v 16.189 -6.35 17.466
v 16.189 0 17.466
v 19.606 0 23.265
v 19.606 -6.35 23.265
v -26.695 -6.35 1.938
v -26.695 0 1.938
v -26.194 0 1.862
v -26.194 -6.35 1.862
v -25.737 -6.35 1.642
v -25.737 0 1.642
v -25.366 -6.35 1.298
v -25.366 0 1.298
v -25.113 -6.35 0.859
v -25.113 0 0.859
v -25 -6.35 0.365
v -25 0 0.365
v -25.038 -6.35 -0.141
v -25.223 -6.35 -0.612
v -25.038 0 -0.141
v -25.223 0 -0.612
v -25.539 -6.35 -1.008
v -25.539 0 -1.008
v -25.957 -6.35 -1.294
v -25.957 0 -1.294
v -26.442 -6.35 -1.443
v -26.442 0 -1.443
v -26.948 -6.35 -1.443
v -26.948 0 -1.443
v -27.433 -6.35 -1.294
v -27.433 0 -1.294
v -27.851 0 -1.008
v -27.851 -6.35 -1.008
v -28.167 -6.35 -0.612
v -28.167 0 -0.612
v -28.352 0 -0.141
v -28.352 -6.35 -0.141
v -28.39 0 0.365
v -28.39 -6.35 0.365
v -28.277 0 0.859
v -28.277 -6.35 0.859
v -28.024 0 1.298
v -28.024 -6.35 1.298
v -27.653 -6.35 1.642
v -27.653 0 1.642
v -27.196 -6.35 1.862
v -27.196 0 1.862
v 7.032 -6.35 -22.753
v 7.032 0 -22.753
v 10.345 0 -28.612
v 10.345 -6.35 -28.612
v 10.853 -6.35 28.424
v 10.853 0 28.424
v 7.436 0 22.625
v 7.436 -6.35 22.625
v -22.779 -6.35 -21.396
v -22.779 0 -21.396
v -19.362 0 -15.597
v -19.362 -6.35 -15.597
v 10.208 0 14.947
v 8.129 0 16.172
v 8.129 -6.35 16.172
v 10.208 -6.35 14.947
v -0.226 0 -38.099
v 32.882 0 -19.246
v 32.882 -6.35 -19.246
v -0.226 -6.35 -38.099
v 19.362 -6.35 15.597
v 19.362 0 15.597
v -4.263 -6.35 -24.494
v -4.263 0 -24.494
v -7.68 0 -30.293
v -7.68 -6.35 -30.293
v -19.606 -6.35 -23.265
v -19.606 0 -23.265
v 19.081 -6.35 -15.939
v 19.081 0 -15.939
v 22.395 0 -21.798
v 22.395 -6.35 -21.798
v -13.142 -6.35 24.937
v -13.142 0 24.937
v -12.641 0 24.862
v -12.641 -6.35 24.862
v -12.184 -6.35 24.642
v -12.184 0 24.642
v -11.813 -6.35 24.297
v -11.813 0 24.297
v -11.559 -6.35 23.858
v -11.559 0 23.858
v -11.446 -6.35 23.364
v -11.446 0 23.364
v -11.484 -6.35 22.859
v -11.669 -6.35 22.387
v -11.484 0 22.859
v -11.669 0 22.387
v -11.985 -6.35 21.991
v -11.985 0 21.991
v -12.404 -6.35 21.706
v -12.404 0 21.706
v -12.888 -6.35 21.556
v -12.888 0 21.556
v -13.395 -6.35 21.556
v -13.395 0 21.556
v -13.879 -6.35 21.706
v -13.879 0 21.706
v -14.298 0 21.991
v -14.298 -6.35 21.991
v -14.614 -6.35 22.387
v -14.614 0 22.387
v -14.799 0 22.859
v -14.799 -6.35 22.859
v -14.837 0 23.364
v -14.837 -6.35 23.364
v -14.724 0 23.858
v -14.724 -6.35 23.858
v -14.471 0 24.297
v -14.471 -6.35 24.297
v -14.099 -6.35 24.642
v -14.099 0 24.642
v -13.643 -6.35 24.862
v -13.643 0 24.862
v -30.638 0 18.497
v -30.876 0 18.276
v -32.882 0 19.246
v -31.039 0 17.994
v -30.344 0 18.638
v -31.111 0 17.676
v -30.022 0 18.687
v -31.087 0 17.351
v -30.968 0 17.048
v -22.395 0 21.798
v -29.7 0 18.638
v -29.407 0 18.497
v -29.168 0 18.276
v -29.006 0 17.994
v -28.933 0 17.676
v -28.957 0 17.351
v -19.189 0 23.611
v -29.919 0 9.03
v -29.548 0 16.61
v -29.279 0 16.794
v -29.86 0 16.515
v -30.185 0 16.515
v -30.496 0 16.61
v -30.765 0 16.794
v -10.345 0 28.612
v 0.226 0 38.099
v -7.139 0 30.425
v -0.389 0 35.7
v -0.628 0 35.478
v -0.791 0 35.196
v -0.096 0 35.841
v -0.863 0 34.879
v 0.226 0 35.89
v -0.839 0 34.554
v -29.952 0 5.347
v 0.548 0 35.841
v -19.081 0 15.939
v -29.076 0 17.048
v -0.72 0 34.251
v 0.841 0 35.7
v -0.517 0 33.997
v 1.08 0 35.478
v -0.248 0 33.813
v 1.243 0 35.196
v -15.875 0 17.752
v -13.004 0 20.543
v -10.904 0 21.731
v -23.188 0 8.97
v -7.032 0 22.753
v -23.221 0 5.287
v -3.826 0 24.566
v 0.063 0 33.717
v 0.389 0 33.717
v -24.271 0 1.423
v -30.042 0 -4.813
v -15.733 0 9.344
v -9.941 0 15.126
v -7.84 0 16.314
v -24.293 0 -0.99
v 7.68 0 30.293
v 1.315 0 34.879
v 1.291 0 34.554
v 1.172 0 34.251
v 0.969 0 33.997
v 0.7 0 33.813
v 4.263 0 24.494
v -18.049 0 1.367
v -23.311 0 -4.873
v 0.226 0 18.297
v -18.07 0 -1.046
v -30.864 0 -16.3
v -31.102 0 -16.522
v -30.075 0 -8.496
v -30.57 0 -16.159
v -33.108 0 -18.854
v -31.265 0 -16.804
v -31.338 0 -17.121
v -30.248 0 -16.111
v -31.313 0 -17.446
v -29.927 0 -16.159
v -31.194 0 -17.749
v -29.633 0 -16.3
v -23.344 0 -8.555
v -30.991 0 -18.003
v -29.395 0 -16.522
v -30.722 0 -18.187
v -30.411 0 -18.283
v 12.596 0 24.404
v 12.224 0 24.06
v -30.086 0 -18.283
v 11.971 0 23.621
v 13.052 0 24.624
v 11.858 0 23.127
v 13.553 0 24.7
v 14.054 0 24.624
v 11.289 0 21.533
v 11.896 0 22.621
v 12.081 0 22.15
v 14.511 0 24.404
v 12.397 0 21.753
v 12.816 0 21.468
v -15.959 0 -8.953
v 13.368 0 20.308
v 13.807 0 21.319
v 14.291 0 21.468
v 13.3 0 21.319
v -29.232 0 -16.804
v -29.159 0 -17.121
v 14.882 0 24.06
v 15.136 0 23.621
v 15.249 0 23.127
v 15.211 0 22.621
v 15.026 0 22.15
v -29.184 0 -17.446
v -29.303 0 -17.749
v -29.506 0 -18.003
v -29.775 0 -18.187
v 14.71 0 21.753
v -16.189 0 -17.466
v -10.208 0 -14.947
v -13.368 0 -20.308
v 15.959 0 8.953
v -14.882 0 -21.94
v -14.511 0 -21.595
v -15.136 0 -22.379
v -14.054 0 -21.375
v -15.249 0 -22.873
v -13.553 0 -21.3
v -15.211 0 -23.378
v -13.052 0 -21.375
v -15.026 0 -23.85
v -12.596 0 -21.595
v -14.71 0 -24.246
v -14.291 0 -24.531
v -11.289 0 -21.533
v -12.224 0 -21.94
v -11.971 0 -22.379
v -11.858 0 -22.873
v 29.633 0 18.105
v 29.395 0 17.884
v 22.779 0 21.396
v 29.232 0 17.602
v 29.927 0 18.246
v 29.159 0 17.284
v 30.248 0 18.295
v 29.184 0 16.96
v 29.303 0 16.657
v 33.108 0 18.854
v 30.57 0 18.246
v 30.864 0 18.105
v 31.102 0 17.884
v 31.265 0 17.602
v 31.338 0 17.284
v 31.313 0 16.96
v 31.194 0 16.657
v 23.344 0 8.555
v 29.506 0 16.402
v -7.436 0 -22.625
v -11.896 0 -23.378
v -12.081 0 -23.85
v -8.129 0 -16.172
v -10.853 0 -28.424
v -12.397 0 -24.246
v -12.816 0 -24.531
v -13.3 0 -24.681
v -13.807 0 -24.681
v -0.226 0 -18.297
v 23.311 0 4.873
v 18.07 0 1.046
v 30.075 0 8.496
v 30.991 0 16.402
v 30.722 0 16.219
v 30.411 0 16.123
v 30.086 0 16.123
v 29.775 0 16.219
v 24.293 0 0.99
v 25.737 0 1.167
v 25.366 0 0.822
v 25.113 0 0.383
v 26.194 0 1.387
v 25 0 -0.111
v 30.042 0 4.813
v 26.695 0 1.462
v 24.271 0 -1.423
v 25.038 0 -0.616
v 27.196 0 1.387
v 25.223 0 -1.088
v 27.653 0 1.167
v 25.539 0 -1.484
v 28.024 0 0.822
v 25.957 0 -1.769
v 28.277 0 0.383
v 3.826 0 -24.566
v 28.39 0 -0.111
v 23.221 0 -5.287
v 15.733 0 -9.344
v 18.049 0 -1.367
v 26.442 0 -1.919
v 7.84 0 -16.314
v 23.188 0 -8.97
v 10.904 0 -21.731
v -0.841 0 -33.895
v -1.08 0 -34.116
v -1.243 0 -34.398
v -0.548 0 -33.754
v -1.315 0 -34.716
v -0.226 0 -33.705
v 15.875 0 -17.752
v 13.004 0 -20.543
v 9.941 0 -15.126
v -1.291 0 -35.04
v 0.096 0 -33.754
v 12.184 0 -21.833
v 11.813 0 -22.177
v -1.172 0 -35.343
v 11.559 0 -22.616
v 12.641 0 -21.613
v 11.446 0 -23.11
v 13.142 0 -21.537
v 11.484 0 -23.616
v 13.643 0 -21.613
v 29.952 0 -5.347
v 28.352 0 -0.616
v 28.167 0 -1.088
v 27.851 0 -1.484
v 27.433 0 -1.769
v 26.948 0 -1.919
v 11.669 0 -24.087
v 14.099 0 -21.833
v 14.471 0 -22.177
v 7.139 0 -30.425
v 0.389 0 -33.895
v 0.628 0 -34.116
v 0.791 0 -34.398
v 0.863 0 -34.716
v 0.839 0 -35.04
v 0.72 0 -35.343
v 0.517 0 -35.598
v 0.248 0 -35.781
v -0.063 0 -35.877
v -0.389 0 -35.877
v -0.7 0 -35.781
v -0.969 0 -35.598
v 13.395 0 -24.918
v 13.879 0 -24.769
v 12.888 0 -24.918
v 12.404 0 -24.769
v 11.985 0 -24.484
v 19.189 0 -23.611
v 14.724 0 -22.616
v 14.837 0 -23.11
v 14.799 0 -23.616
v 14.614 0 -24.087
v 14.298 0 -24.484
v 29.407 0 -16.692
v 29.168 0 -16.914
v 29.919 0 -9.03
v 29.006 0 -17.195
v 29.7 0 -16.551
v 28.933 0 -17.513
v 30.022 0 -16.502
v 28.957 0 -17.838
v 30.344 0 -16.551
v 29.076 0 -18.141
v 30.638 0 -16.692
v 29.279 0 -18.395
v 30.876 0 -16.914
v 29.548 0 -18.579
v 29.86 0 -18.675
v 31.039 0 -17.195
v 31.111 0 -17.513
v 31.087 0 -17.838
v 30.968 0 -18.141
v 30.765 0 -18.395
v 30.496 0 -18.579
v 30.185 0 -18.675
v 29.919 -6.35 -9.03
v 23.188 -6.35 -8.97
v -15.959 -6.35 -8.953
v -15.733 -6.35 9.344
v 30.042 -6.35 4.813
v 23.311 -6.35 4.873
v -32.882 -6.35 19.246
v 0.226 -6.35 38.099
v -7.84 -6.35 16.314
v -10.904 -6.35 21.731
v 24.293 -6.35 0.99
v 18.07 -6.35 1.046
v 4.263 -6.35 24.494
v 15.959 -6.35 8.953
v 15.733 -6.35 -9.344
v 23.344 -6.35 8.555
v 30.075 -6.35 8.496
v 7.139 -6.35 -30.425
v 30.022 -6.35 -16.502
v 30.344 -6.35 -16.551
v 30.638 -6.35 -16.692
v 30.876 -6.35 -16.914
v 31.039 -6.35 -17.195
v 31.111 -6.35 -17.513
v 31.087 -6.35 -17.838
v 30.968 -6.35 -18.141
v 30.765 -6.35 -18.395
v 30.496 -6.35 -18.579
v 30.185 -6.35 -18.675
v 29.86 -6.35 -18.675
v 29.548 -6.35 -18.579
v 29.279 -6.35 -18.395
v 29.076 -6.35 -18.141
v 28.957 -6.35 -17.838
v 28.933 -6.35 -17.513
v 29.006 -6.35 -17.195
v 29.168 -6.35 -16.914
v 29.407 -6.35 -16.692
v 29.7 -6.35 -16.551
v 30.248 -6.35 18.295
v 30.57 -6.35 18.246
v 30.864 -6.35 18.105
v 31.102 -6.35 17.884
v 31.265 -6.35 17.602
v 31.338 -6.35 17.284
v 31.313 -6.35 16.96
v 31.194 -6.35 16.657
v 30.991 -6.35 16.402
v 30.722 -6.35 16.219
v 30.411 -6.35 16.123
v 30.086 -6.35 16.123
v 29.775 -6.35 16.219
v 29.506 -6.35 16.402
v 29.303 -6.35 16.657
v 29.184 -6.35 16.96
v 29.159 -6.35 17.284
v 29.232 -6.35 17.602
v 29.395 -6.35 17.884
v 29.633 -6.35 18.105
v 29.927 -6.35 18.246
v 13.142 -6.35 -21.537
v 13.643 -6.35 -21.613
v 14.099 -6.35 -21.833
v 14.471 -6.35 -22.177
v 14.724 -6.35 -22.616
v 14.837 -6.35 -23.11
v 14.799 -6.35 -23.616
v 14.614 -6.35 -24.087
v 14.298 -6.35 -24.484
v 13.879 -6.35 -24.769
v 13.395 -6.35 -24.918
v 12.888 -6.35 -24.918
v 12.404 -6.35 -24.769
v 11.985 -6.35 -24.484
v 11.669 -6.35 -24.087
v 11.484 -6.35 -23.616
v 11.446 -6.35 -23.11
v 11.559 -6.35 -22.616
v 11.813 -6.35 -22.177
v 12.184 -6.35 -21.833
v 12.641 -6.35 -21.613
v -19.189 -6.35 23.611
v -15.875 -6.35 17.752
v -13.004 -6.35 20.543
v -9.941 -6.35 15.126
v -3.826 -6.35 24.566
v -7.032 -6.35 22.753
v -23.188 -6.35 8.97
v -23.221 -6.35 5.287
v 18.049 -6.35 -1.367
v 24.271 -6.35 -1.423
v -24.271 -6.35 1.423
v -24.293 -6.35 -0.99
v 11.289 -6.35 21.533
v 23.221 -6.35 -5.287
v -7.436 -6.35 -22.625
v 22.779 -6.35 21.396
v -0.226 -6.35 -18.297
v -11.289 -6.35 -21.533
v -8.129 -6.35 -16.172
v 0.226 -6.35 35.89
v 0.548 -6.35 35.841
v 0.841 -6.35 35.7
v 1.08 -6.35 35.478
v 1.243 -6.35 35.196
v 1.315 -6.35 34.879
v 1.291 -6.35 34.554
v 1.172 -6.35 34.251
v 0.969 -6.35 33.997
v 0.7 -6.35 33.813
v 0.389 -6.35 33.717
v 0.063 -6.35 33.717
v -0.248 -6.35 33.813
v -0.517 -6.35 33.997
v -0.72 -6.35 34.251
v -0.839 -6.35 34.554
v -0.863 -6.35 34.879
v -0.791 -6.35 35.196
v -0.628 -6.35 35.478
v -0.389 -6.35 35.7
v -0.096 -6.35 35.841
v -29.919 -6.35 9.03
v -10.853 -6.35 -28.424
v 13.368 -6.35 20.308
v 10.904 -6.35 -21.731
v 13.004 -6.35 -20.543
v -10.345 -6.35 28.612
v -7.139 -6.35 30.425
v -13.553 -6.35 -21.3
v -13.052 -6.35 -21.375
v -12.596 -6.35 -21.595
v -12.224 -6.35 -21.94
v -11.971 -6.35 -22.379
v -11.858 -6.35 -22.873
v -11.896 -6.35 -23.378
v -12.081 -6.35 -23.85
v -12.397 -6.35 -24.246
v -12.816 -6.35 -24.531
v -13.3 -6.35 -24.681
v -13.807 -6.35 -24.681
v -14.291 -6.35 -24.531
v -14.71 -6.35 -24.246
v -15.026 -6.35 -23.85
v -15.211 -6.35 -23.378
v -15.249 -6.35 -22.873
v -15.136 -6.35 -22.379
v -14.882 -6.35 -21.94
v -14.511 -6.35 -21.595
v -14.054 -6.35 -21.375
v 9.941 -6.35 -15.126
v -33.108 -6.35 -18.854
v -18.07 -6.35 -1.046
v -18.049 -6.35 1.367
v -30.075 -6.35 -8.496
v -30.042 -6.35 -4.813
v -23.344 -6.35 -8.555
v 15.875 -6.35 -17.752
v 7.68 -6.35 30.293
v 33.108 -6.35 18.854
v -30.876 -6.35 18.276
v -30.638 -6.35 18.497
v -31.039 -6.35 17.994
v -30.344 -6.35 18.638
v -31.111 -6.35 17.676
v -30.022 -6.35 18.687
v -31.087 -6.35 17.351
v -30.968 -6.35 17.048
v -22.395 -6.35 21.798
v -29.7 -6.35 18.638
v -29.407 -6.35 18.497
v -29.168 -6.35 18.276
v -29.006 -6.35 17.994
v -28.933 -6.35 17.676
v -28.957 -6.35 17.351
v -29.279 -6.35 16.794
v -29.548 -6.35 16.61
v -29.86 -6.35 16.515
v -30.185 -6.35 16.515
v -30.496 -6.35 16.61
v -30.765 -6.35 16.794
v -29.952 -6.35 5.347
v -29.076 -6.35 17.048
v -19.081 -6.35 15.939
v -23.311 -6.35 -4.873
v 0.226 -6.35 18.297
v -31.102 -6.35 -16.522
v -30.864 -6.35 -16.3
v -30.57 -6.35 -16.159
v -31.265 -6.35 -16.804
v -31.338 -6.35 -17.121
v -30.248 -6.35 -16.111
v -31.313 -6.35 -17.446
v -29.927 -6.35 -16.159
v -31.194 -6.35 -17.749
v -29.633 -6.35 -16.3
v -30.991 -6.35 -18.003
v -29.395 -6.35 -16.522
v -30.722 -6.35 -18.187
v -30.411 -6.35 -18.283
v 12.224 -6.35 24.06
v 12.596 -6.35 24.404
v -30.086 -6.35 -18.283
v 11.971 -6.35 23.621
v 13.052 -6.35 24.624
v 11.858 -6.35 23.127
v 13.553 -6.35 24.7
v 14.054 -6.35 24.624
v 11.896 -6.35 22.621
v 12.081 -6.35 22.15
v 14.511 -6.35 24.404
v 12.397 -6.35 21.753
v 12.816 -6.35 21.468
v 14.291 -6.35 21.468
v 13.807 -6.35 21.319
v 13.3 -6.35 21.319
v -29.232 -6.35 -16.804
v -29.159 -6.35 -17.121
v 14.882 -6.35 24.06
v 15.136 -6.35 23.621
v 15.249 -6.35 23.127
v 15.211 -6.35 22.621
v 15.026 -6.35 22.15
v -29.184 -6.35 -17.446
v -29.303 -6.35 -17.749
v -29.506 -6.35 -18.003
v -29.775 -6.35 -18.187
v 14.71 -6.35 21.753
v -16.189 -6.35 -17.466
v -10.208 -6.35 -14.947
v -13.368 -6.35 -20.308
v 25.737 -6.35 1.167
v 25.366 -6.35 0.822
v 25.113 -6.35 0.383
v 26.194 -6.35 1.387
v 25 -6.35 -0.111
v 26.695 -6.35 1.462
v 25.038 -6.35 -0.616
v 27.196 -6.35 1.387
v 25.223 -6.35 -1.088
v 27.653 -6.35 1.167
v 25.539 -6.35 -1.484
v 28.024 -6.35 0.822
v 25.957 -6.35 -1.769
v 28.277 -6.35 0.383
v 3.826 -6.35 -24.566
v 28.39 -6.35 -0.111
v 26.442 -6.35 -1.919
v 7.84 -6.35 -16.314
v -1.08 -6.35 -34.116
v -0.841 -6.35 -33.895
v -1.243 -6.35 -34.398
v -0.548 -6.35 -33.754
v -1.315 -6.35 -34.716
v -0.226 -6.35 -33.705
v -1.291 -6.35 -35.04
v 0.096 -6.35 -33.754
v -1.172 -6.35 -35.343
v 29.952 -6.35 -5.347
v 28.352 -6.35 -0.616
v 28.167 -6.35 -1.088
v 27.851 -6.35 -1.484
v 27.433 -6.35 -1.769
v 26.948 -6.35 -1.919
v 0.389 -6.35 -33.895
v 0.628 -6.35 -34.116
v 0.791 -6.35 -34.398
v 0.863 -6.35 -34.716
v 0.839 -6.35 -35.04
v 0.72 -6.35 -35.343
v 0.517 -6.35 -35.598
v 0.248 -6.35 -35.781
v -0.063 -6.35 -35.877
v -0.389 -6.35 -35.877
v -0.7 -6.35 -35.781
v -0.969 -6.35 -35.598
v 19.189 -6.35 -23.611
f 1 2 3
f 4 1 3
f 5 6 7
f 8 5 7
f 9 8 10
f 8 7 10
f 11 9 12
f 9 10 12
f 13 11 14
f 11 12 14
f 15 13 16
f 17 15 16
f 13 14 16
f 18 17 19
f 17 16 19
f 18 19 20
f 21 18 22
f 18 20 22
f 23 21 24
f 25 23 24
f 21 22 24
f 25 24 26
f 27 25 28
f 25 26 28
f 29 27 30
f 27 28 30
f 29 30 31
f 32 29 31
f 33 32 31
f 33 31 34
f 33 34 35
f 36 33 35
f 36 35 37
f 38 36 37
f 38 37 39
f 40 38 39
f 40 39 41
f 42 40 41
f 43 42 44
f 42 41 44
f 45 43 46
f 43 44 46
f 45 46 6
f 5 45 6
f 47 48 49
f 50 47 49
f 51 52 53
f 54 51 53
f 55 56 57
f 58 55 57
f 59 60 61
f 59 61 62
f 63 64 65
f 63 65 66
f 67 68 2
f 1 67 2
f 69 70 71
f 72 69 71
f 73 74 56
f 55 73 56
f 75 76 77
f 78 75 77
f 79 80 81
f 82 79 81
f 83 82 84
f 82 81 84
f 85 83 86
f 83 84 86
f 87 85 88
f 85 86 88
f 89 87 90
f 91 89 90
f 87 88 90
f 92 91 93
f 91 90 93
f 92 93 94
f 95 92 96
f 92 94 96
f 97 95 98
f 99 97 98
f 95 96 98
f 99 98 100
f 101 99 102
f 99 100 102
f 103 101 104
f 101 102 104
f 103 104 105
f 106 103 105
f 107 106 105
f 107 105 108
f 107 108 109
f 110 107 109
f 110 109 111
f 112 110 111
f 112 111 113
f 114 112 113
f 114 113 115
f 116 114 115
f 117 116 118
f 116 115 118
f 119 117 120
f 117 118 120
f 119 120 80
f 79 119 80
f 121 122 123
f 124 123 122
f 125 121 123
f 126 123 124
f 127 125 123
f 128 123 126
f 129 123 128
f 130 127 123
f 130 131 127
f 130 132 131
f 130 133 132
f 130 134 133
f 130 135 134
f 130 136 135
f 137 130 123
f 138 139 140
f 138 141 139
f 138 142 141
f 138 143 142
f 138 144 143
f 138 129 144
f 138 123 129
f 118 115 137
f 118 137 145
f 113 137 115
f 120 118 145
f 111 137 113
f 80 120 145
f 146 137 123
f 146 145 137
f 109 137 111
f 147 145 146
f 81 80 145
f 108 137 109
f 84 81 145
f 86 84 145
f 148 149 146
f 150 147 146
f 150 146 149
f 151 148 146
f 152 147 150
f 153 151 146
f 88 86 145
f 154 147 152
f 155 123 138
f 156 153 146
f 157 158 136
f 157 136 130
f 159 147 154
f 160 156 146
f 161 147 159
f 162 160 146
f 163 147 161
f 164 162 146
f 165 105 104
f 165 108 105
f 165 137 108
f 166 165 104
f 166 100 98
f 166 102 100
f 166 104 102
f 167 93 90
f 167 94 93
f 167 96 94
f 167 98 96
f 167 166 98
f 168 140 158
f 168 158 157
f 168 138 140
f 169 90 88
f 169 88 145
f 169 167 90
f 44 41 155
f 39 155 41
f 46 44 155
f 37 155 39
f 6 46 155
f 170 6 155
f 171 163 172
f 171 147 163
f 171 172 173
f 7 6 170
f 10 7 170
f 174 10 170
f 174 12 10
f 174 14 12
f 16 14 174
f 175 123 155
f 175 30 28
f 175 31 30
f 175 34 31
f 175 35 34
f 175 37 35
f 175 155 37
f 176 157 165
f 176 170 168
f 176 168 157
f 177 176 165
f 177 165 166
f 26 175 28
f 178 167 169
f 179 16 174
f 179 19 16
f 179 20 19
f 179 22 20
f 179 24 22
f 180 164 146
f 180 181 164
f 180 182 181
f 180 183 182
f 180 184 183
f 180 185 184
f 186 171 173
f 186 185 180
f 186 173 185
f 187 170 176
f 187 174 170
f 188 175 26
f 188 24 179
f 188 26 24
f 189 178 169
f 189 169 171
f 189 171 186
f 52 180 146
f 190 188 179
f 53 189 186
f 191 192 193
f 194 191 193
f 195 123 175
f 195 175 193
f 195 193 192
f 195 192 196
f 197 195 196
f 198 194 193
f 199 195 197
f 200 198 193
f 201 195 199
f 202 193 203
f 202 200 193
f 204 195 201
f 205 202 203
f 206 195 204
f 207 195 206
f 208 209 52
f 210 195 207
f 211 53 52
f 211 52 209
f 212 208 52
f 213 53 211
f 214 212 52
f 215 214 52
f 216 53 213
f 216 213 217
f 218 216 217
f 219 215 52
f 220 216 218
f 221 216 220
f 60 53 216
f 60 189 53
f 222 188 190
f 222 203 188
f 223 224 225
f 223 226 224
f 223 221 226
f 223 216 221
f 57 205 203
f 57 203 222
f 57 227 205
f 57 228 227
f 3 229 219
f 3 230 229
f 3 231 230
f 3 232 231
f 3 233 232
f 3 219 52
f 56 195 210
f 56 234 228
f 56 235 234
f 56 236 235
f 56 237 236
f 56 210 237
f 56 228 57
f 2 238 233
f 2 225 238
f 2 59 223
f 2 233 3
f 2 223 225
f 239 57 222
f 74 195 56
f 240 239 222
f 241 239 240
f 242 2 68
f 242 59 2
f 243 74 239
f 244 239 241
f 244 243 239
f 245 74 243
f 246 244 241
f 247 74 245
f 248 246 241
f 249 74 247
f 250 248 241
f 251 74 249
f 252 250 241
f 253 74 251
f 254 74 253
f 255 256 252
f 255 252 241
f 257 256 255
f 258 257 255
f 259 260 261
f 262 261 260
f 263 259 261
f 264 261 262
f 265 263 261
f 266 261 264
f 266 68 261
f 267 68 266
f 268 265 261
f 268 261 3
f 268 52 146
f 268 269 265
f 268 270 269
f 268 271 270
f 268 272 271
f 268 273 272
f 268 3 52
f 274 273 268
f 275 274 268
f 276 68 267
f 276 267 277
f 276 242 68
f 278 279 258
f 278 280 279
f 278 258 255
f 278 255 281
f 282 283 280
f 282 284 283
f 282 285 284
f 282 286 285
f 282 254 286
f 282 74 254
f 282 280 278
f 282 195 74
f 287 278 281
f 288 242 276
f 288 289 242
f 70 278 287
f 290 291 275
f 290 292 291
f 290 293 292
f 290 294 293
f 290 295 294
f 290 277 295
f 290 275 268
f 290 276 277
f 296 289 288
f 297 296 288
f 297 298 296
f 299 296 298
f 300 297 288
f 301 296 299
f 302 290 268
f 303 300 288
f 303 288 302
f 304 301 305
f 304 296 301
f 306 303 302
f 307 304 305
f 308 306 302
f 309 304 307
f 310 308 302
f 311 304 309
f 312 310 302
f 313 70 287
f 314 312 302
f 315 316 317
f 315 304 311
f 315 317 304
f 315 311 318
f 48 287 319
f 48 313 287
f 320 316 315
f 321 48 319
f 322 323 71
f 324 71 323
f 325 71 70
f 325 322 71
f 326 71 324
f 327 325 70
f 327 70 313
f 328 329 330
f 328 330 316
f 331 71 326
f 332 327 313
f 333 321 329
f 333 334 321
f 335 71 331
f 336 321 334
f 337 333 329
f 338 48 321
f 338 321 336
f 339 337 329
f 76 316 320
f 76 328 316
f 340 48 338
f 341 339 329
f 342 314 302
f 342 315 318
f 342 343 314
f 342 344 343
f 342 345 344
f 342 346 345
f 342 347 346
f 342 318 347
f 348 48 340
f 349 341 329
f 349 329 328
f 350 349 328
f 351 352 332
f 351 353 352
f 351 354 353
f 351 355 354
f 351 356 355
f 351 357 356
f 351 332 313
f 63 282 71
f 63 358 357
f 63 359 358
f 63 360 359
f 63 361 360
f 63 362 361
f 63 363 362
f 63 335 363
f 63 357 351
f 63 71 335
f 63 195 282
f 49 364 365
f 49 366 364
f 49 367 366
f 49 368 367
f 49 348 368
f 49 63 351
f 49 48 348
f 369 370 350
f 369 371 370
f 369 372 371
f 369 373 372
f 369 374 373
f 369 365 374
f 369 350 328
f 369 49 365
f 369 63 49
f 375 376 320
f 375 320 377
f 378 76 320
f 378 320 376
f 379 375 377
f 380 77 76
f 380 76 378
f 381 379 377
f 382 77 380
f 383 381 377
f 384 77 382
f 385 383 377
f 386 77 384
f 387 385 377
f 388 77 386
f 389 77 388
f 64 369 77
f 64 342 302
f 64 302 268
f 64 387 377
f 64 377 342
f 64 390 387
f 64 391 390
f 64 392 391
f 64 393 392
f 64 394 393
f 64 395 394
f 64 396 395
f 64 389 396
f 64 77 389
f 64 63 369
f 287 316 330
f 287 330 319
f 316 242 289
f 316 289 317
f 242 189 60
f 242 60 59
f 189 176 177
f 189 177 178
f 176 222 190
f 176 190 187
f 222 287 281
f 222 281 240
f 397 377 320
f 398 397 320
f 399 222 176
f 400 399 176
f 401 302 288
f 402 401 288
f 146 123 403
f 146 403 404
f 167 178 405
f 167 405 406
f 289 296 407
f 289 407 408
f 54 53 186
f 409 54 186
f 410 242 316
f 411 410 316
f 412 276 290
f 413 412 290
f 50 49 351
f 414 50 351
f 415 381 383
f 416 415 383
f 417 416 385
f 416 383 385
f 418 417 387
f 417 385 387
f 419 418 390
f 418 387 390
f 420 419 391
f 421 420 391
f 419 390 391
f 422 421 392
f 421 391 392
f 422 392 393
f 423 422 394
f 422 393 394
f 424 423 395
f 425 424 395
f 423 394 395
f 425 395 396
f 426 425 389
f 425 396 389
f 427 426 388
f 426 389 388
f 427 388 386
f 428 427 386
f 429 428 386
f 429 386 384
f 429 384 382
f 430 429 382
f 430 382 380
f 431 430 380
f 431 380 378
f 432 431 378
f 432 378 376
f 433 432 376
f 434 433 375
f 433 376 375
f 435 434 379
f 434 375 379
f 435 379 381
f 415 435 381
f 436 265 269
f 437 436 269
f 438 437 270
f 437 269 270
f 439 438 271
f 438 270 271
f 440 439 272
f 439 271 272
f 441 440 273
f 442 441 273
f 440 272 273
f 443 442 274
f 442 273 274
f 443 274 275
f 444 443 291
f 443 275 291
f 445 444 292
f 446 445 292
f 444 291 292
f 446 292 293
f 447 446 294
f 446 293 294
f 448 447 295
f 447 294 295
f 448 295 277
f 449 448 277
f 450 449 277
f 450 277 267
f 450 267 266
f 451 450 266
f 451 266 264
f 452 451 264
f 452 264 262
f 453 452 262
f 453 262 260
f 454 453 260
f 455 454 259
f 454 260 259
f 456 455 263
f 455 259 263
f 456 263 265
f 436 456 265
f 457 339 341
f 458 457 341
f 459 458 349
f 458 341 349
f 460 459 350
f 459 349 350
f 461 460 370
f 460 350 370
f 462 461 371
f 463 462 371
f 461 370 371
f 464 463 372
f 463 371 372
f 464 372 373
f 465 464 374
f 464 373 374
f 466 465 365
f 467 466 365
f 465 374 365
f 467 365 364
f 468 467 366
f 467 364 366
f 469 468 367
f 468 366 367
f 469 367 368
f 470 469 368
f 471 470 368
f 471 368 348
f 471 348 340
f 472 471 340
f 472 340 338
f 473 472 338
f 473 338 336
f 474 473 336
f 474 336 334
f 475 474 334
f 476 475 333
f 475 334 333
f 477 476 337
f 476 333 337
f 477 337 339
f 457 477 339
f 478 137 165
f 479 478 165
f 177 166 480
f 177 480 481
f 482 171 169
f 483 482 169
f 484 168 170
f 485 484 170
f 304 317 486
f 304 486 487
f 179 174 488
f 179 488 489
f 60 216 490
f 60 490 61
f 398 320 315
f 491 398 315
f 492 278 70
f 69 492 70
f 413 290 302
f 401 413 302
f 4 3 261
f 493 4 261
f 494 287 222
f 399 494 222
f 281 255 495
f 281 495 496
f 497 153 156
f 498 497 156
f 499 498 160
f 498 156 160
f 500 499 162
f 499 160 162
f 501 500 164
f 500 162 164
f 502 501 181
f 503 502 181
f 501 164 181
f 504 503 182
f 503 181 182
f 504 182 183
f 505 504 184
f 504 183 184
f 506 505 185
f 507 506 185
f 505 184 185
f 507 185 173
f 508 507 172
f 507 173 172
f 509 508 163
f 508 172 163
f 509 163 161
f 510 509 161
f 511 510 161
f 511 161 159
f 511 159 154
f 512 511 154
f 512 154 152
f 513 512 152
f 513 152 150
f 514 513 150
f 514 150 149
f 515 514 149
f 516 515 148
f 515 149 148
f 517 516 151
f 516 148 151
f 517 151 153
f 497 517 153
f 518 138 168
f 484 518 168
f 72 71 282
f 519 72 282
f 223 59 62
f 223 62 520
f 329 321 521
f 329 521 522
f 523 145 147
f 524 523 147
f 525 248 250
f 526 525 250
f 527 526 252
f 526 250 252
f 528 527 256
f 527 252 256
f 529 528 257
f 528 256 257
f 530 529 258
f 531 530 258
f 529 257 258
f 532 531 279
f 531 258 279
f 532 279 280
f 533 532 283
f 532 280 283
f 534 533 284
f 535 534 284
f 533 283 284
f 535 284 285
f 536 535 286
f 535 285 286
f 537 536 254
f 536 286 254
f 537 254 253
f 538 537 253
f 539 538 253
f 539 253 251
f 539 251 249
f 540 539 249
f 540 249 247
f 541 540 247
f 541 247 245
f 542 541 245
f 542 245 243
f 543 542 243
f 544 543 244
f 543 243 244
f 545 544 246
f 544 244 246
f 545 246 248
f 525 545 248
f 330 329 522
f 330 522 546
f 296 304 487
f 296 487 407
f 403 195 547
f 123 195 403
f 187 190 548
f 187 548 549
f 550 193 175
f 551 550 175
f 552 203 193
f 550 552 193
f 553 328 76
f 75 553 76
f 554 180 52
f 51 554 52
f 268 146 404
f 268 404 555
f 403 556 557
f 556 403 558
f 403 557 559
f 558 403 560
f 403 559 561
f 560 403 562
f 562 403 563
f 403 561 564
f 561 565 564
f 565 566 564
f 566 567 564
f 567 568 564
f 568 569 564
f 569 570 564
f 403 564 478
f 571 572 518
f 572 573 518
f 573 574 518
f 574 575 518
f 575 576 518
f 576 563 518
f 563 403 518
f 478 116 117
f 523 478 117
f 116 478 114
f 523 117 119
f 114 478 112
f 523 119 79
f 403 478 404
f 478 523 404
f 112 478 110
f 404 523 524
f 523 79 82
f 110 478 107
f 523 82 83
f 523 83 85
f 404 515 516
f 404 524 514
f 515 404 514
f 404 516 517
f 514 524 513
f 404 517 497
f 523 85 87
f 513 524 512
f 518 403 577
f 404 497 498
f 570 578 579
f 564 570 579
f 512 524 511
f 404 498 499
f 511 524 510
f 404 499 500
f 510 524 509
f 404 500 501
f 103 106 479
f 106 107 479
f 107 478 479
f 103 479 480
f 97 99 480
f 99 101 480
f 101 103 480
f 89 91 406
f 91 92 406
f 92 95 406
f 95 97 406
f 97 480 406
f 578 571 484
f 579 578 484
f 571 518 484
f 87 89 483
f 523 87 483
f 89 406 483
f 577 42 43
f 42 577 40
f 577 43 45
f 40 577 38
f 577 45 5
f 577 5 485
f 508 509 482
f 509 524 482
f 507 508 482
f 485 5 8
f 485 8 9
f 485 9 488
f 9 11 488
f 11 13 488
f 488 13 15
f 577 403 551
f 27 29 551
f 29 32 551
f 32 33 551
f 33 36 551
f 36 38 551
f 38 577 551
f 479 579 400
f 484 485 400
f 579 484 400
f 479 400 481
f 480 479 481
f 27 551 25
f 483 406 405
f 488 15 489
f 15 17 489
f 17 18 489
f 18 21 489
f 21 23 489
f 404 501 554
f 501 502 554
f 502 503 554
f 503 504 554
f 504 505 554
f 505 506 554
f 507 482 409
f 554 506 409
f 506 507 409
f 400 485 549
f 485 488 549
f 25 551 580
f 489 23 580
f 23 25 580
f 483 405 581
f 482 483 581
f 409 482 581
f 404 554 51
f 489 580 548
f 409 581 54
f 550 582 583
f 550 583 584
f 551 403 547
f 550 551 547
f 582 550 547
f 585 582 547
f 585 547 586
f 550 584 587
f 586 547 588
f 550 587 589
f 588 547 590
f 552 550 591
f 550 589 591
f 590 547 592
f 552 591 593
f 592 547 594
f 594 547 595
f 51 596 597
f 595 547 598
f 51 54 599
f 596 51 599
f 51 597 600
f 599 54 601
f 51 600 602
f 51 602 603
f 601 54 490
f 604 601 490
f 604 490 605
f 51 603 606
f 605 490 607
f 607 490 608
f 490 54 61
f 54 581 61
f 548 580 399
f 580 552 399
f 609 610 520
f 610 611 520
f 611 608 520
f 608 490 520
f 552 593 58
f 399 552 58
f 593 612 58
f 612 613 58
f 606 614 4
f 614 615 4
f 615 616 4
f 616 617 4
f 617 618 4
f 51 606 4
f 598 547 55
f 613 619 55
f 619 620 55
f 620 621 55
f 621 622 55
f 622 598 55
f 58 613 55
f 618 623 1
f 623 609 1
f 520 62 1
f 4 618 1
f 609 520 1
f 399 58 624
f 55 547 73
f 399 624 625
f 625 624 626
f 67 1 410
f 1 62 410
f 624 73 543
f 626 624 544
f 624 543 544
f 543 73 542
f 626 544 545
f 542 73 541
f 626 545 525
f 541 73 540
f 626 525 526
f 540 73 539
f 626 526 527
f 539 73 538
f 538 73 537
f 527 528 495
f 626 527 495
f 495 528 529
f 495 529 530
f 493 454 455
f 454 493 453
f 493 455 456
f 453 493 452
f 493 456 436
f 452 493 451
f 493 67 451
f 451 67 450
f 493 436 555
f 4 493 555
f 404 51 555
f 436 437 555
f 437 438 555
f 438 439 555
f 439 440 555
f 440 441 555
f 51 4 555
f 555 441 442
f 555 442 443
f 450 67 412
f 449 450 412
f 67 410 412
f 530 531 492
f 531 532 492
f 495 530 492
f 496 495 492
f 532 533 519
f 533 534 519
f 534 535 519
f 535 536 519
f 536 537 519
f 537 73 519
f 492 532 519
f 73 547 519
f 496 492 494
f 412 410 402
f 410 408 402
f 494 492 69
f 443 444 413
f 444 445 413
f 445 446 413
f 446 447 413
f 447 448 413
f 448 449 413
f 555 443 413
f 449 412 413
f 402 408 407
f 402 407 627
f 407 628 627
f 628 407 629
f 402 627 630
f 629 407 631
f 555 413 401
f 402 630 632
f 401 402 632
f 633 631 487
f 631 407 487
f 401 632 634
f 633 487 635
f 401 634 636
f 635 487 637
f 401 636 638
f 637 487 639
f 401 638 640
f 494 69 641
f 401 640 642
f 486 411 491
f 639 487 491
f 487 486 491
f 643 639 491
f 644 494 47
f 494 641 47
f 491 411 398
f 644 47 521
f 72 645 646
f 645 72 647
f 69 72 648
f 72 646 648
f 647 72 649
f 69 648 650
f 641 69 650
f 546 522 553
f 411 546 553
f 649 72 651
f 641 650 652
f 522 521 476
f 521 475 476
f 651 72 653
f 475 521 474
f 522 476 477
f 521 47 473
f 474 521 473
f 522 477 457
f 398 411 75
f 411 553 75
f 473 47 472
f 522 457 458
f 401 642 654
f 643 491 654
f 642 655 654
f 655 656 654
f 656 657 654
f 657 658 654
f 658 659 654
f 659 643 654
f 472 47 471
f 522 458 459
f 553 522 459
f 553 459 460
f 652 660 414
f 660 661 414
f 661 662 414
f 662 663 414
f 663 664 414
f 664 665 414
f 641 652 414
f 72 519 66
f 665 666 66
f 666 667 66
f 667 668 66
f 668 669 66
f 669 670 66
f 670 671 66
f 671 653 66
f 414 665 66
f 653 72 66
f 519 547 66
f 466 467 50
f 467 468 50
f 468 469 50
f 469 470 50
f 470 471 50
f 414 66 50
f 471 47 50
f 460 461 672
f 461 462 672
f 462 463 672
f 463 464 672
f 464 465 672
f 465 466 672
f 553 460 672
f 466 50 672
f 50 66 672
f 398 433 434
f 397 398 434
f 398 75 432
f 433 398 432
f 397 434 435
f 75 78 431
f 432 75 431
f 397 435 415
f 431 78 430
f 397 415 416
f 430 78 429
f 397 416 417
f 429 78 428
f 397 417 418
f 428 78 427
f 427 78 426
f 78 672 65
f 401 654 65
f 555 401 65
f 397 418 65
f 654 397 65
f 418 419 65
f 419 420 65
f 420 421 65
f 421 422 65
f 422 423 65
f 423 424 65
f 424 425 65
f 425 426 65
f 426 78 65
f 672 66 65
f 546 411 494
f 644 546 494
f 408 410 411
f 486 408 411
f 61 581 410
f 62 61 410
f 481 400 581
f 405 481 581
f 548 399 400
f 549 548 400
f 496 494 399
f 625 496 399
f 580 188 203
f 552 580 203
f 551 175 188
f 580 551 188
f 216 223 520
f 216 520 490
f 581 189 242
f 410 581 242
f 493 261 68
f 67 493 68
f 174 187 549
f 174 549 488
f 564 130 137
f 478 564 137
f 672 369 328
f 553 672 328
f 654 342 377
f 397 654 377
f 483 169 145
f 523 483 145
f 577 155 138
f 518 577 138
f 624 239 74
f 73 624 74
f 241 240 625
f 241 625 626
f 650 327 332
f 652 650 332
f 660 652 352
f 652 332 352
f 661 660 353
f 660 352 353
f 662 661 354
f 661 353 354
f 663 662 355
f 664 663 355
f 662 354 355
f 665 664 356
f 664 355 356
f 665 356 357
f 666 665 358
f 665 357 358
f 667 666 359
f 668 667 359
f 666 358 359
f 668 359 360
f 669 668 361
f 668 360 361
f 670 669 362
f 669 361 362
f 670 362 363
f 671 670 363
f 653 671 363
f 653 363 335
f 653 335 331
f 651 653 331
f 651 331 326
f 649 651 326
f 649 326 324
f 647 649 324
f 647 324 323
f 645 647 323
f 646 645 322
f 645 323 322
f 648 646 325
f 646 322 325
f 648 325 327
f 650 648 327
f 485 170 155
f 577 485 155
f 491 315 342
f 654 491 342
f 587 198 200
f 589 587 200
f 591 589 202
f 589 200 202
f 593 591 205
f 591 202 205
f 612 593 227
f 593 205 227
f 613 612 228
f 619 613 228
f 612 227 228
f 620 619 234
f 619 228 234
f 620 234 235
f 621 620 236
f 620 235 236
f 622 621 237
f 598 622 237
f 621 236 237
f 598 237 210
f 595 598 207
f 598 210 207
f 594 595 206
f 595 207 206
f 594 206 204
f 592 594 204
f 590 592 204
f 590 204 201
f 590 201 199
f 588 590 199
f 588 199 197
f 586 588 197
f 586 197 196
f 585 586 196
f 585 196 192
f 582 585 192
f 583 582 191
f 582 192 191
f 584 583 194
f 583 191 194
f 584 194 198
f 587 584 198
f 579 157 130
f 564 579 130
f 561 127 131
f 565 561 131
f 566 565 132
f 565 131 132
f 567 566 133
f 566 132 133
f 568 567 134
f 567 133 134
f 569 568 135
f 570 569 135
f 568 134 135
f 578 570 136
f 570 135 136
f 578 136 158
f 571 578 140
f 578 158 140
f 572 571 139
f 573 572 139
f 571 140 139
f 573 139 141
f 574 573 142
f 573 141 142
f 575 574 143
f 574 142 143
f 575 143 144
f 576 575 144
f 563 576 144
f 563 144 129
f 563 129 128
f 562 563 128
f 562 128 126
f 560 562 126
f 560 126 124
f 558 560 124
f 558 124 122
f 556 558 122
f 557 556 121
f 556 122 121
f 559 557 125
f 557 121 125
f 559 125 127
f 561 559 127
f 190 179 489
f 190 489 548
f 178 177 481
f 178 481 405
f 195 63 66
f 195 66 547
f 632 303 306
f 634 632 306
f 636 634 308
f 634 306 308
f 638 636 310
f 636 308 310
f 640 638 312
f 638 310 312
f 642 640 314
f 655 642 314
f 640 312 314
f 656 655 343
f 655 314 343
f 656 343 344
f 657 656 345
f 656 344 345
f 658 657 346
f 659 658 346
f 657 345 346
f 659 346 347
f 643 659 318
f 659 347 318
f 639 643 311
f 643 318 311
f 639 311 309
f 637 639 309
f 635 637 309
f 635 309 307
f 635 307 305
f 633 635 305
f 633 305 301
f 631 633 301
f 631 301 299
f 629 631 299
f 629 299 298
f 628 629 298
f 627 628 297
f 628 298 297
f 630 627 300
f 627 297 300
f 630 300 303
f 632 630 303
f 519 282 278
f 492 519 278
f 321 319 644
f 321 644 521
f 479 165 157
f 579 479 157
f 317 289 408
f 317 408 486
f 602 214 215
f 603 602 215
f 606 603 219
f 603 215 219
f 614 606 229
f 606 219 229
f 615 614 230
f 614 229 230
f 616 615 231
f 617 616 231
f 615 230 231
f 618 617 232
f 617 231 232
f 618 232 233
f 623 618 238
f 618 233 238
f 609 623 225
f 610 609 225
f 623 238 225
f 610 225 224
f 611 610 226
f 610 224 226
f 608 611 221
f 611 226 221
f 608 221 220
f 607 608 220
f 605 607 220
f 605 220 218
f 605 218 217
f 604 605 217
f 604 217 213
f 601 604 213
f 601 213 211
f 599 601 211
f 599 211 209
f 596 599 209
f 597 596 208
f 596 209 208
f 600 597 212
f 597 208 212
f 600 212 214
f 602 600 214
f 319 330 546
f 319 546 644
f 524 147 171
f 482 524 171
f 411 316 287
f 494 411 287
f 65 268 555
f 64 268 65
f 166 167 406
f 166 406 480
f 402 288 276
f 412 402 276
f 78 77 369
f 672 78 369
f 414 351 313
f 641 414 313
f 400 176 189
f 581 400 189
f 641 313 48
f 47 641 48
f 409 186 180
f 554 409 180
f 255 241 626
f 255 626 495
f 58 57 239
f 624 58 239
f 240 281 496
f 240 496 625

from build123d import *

# Parameters (mm, degrees)
SKETCH1_R           = 1.7
SKETCH1_R_2         = 1.0922
BOSS_EXTRUDE1_DEPTH = 6.35


with BuildPart() as part:
    # Sketch1 → Boss-Extrude1 (new body)
    with BuildSketch(Plane(origin=(0, 0, 0), x_dir=(1, 0, 0), z_dir=(0, 1, 0))):
        Polygon((33.108066621, -18.853803983), (32.881906518, 19.245524772), (-0.226160103, 38.099328755), (-33.108066621, 18.853803983), (-32.881906518, -19.245524772), (0.226160103, -38.099328755), align=None)
        Polygon((18.048586735, 1.367257752), (24.27134005, 1.422666977), (24.29282526, -0.990237369), (18.070071945, -1.045646595), align=None, mode=Mode.SUBTRACT)
        Polygon((10.208373314, -14.946905739), (13.367735769, -20.308263579), (11.288841912, -21.53332249), (8.129479458, -16.17196465), align=None, mode=Mode.SUBTRACT)
        Polygon((-7.840213421, -16.314163491), (-10.903604282, -21.730930556), (-13.003983348, -20.54308512), (-9.940592487, -15.126318055), align=None, mode=Mode.SUBTRACT)
        Polygon((-18.048586735, -1.367257752), (-24.27134005, -1.422666977), (-24.29282526, 0.990237369), (-18.070071945, 1.045646595), align=None, mode=Mode.SUBTRACT)
        Polygon((-10.208373314, 14.946905739), (-13.367735769, 20.308263579), (-11.288841912, 21.53332249), (-8.129479458, 16.17196465), align=None, mode=Mode.SUBTRACT)
        Polygon((7.840213421, 16.314163491), (10.903604282, 21.730930556), (13.003983348, 20.54308512), (9.940592487, 15.126318055), align=None, mode=Mode.SUBTRACT)
        Polygon((-0.226160103, 18.296993457), (15.732581095, 9.344357123), (15.958741198, -8.952636334), (0.226160103, -18.296993457), (-15.732581095, -9.344357123), (-15.958741198, 8.952636334), align=None, mode=Mode.SUBTRACT)
        Polygon((-19.081340765, -15.938883228), (-15.875499033, -17.751910472), (-19.188962617, -23.610862603), (-22.394804349, -21.797835359), align=None, mode=Mode.SUBTRACT)
        with Locations((-13.14163925, -23.237386904)):
            Circle(SKETCH1_R, mode=Mode.SUBTRACT)
        Polygon((-7.031797703, -22.753364938), (-3.825955971, -24.566392182), (-7.139419555, -30.425344314), (-10.345261287, -28.61231707), align=None, mode=Mode.SUBTRACT)
        with Locations((-30.022290634, -17.594524772)):
            Circle(SKETCH1_R_2, mode=Mode.SUBTRACT)
        Polygon((-23.22089091, -5.286967024), (-23.188097695, -8.969821027), (-29.918830872, -9.029753454), (-29.951624087, -5.346899452), align=None, mode=Mode.SUBTRACT)
        with Locations((-26.694987002, -0.237700014)):
            Circle(SKETCH1_R, mode=Mode.SUBTRACT)
        with Locations((0.226160103, -34.797328755)):
            Circle(SKETCH1_R_2, mode=Mode.SUBTRACT)
        Polygon((4.262807401, -24.494367455), (7.435855918, -22.624540696), (10.853125511, -28.4235604), (7.680076994, -30.293387159), align=None, mode=Mode.SUBTRACT)
        with Locations((13.553347751, -22.99968689)):
            Circle(SKETCH1_R, mode=Mode.SUBTRACT)
        Polygon((16.189093207, -17.466397914), (19.362141724, -15.596571155), (22.779411317, -21.395590859), (19.6063628, -23.265417618), align=None, mode=Mode.SUBTRACT)
        with Locations((30.248450738, -17.202803983)):
            Circle(SKETCH1_R_2, mode=Mode.SUBTRACT)
        Polygon((23.344148166, -8.555484227), (23.311354951, -4.872630224), (30.042088128, -4.812697797), (30.074881343, -8.4955518), align=None, mode=Mode.SUBTRACT)
        Polygon((-23.344148166, 8.555484227), (-23.311354951, 4.872630224), (-30.042088128, 4.812697797), (-30.074881343, 8.4955518), align=None, mode=Mode.SUBTRACT)
        with Locations((-30.248450738, 17.202803983)):
            Circle(SKETCH1_R_2, mode=Mode.SUBTRACT)
        Polygon((-16.189093207, 17.466397914), (-19.362141724, 15.596571155), (-22.779411317, 21.395590859), (-19.6063628, 23.265417618), align=None, mode=Mode.SUBTRACT)
        with Locations((-13.553347751, 22.99968689)):
            Circle(SKETCH1_R, mode=Mode.SUBTRACT)
        Polygon((-7.435855918, 22.624540696), (-10.853125511, 28.4235604), (-7.680076994, 30.293387159), (-4.262807401, 24.494367455), align=None, mode=Mode.SUBTRACT)
        with Locations((-0.226160103, 34.797328755)):
            Circle(SKETCH1_R_2, mode=Mode.SUBTRACT)
        Polygon((29.918830872, 9.029753454), (29.951624087, 5.346899452), (23.22089091, 5.286967024), (23.188097695, 8.969821027), align=None, mode=Mode.SUBTRACT)
        with Locations((30.022290634, 17.594524772)):
            Circle(SKETCH1_R_2, mode=Mode.SUBTRACT)
        Polygon((7.031797703, 22.753364938), (3.825955971, 24.566392182), (7.139419555, 30.425344314), (10.345261287, 28.61231707), align=None, mode=Mode.SUBTRACT)
        with Locations((13.14163925, 23.237386904)):
            Circle(SKETCH1_R, mode=Mode.SUBTRACT)
        Polygon((19.081340765, 15.938883228), (15.875499033, 17.751910472), (19.188962617, 23.610862603), (22.394804349, 21.797835359), align=None, mode=Mode.SUBTRACT)
        with Locations((26.694987002, 0.237700014)):
            Circle(SKETCH1_R, mode=Mode.SUBTRACT)
    extrude(amount=-BOSS_EXTRUDE1_DEPTH)


solid = part.part
